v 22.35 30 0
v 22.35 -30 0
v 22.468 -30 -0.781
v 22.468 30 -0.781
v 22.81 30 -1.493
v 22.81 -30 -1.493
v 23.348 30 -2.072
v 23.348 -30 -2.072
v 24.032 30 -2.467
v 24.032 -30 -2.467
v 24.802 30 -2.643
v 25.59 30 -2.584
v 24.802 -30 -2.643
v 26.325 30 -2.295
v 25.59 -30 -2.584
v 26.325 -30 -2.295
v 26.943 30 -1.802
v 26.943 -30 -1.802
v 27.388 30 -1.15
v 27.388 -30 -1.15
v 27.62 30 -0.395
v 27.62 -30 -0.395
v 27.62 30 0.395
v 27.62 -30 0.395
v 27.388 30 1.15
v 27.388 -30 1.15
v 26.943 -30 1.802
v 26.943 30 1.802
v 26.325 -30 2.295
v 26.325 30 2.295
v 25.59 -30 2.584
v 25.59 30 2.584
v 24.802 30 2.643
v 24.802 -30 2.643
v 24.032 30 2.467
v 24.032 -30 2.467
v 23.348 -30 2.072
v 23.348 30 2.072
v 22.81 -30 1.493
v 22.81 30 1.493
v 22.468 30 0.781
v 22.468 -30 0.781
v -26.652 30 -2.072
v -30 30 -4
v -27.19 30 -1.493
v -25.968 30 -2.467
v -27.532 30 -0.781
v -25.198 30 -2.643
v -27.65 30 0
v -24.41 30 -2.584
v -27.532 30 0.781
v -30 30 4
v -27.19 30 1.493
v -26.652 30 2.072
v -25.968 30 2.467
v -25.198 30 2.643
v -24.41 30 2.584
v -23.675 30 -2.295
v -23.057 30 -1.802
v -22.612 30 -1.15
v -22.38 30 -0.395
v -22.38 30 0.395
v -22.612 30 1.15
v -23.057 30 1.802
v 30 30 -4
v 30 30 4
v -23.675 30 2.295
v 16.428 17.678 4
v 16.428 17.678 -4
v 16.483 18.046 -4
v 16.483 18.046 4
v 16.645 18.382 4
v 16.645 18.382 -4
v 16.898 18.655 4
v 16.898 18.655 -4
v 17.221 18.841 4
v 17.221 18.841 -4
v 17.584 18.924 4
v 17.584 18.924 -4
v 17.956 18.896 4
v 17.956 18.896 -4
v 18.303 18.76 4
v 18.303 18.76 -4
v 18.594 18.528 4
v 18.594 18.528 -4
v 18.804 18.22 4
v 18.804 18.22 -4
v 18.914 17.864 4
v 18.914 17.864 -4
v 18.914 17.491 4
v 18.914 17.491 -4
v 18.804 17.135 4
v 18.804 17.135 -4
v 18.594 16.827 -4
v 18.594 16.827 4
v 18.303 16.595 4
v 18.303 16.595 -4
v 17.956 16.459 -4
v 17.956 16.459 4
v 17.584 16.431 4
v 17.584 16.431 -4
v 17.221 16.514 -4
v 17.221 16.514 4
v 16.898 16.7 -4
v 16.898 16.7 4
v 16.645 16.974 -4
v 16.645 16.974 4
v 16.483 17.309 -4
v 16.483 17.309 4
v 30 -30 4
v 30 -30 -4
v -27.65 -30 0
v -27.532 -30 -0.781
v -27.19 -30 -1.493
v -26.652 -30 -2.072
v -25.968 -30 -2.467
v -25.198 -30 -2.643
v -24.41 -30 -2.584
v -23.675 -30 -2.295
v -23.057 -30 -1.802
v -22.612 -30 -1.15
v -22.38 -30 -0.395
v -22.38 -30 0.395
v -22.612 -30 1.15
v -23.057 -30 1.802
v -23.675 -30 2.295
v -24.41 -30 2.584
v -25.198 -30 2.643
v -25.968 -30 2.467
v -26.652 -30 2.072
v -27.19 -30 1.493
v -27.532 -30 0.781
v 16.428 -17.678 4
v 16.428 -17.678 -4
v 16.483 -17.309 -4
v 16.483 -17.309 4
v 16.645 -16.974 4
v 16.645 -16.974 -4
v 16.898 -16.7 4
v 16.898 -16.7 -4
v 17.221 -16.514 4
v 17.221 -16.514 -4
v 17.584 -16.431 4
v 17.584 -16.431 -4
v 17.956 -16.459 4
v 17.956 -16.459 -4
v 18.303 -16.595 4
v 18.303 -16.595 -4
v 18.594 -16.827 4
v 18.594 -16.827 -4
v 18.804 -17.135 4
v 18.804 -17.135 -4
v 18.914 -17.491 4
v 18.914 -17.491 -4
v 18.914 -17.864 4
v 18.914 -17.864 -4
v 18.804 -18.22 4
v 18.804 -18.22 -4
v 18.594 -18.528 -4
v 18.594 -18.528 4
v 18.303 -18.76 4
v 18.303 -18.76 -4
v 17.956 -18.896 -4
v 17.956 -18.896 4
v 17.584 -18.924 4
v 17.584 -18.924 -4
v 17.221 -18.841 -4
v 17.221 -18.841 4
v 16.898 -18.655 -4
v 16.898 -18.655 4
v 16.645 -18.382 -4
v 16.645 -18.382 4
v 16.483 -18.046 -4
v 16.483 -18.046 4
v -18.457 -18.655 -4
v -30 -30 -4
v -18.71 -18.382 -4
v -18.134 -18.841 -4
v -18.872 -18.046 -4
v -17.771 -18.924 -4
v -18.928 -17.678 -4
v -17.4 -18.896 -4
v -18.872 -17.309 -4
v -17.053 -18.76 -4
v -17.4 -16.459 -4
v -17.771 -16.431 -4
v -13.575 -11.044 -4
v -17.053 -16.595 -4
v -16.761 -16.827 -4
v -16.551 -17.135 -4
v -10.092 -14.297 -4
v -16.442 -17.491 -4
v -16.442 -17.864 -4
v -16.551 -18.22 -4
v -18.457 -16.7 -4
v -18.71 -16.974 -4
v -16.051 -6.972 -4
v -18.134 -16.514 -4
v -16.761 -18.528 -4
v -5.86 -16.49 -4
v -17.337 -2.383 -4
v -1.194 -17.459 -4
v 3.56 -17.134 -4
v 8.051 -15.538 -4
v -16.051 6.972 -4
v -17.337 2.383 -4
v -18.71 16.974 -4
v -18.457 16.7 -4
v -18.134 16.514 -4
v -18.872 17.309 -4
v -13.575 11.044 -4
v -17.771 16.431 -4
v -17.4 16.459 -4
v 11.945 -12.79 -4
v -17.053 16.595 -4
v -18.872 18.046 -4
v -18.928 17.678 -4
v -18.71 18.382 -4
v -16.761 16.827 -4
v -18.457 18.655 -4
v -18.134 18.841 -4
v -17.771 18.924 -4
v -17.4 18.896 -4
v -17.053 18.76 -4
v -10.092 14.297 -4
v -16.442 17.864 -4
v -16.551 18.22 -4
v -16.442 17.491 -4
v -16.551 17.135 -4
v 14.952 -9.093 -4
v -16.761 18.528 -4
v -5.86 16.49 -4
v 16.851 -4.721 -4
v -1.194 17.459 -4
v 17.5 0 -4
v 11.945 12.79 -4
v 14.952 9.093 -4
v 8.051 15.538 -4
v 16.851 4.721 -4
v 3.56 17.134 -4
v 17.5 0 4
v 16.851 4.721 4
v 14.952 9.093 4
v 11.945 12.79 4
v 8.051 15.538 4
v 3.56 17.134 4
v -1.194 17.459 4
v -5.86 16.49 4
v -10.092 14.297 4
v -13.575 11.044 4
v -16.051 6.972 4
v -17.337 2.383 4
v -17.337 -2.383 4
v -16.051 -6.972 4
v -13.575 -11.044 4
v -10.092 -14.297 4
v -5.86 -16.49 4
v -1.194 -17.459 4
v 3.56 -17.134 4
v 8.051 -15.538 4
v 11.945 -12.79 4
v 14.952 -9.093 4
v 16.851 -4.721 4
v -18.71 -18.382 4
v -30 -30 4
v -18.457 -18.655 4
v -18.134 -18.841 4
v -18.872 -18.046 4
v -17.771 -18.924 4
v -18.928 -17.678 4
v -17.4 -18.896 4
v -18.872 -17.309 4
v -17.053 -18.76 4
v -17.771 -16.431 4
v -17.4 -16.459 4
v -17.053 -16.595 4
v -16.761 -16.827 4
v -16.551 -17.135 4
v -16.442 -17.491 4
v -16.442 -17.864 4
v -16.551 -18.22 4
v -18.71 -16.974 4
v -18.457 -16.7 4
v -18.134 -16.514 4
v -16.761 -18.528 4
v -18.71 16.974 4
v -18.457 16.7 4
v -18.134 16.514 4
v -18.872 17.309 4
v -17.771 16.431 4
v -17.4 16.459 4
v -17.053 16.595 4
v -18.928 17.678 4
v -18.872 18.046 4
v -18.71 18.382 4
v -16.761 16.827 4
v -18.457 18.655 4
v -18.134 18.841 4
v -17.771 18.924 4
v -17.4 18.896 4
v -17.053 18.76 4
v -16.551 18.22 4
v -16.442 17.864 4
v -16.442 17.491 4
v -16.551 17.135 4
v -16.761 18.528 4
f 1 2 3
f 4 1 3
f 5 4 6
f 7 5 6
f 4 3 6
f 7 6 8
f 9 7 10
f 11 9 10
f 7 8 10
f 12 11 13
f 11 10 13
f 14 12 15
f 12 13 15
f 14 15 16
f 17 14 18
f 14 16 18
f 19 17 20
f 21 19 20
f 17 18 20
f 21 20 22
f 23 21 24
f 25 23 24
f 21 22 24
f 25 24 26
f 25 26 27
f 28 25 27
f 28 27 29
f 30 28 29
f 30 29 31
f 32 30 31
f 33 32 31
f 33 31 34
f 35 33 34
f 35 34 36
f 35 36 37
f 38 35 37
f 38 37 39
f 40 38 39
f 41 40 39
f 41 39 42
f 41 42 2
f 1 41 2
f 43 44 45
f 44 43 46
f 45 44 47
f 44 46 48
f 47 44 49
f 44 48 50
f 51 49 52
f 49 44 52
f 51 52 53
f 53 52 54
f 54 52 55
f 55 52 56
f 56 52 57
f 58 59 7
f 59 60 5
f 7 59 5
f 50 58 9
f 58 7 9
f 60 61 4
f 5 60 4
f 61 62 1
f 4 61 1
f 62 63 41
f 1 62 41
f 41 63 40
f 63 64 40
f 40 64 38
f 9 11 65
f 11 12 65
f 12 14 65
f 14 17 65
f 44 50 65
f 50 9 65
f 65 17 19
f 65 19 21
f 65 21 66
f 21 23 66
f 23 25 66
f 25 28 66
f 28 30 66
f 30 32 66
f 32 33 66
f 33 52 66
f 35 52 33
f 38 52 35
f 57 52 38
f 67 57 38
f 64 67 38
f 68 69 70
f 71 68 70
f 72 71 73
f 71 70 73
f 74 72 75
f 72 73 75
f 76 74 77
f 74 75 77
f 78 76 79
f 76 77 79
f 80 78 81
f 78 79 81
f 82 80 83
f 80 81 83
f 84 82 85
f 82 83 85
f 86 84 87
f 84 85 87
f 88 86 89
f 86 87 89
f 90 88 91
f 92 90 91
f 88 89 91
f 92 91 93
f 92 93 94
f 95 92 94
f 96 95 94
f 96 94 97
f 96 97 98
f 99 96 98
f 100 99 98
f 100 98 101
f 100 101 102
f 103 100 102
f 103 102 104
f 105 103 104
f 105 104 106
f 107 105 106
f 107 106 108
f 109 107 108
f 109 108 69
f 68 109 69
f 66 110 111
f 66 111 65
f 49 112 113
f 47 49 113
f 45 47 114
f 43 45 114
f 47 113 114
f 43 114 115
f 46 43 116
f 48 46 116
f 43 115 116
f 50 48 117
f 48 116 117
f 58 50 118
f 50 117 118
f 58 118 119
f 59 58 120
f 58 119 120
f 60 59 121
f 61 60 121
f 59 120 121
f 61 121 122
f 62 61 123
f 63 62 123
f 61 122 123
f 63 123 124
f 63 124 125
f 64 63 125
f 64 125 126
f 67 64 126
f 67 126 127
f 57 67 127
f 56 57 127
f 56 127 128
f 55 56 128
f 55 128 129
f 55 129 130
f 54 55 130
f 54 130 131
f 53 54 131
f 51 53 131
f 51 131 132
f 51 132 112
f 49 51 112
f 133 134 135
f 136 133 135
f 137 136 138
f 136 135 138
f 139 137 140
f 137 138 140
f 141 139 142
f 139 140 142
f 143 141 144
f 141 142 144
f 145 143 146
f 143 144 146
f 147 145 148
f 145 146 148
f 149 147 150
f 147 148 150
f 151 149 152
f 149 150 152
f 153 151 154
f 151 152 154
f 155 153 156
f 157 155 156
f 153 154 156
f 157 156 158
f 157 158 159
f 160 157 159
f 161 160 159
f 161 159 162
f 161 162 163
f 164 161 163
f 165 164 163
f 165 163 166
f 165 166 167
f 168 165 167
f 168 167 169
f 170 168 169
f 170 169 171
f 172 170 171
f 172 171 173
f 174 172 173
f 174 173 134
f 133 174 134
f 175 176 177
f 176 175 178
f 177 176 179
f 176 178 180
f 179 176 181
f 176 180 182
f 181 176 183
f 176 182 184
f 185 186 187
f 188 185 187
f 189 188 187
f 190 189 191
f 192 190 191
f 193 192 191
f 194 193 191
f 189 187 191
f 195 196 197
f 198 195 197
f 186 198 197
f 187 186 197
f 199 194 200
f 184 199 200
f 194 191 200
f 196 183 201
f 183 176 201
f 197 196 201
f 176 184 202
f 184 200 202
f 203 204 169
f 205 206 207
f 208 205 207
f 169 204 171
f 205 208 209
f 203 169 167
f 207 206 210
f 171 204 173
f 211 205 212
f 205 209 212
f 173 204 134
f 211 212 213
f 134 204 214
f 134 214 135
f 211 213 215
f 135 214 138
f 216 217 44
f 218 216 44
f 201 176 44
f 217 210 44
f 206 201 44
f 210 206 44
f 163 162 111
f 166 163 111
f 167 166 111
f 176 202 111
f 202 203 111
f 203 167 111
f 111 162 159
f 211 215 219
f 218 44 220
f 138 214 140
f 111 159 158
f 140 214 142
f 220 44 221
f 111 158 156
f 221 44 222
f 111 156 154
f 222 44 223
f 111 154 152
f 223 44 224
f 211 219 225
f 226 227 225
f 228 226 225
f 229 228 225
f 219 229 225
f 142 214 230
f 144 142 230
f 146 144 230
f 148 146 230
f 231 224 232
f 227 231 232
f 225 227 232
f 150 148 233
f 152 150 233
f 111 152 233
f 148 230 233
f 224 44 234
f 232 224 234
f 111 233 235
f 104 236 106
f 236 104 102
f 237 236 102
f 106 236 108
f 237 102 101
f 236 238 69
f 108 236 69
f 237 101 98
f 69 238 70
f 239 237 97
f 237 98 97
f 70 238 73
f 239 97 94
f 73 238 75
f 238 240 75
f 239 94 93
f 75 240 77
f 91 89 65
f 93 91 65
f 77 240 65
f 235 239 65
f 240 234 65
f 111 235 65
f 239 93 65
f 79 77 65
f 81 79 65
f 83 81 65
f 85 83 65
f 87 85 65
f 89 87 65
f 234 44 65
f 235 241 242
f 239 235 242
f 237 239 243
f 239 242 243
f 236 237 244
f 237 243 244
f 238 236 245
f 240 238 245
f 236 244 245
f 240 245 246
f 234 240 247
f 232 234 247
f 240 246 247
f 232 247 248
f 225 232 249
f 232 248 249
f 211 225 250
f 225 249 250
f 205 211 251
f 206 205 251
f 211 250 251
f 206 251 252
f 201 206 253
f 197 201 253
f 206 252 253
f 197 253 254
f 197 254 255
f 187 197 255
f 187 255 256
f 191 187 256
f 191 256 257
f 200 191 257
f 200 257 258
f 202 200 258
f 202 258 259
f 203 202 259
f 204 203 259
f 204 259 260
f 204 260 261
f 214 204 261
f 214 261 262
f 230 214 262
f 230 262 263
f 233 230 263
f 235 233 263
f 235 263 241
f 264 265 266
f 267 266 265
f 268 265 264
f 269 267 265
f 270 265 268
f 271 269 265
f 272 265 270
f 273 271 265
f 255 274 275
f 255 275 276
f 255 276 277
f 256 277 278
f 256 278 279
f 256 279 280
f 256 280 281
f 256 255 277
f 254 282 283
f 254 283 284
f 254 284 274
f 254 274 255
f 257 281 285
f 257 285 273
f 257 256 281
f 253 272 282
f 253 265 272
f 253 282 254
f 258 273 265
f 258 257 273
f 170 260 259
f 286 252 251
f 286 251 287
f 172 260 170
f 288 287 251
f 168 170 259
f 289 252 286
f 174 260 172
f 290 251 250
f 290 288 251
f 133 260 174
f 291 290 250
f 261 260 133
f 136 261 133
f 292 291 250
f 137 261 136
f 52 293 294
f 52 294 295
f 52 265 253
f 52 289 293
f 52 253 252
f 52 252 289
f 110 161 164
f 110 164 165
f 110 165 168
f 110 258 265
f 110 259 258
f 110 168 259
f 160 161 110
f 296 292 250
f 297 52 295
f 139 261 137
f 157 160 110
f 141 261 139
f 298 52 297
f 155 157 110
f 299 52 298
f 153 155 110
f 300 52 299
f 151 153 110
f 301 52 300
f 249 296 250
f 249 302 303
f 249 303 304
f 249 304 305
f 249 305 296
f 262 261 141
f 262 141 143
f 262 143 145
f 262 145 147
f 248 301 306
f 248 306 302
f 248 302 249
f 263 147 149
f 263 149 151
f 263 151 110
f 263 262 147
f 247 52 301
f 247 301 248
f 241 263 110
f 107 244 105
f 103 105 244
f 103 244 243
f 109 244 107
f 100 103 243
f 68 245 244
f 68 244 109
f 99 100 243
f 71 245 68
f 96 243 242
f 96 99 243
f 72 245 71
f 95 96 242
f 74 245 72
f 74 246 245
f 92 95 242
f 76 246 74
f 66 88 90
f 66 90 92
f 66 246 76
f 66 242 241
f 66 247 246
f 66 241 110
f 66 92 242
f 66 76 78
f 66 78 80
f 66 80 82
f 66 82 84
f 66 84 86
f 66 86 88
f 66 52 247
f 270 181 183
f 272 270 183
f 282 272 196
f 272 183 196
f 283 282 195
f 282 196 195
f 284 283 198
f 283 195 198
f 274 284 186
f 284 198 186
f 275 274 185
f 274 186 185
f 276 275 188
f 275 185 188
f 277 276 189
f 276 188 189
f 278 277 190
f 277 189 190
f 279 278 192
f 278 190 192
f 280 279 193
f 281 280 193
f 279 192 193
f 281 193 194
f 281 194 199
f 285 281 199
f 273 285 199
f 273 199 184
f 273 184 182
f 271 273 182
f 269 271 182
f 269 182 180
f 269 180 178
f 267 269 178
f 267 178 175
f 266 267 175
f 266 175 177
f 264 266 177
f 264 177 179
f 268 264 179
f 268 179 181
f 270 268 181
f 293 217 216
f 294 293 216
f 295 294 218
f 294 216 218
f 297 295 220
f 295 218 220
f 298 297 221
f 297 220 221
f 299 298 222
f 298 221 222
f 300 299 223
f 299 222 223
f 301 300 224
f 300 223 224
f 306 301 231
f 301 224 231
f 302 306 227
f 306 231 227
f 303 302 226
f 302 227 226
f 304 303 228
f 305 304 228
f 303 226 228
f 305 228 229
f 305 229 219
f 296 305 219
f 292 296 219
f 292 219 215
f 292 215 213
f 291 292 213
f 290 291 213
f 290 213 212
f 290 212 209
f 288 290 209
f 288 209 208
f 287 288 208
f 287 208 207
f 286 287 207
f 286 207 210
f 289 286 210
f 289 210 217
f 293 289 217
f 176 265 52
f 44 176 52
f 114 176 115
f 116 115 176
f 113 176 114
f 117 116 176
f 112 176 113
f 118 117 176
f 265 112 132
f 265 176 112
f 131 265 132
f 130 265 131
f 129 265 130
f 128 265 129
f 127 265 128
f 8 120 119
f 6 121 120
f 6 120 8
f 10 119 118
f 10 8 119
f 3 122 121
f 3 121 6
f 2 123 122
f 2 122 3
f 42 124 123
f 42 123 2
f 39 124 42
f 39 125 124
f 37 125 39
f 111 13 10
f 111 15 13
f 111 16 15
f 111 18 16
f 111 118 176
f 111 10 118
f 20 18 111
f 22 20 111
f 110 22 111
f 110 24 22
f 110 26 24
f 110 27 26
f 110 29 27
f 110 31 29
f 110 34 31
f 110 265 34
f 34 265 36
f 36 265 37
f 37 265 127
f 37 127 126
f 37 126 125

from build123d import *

# Parameters (mm, degrees)
SKETCH_1_W          = 60
SKETCH_1_H          = 60
EXTRUDE_1_DEPTH     = 4
SKETCH_2_R          = 17.5
CUT_EXTRUDE_1_DEPTH = 44.17406629
HOLE_WIZARD_M3_1_D  = 2.5
HOLE_WIZARD_M5_1_D  = 5.3


with BuildPart() as part:
    # 草圖1 → 填料-伸長1 (new, symmetric)
    with BuildSketch(Plane.XY):
        Rectangle(SKETCH_1_W, SKETCH_1_H)
    extrude(amount=EXTRUDE_1_DEPTH, both=True)

    # 草圖2 → 除料-伸長1 (cut, through all)
    with BuildSketch(Plane.XY.offset(4)):
        Circle(SKETCH_2_R)
    extrude(amount=-CUT_EXTRUDE_1_DEPTH, mode=Mode.SUBTRACT)

    # M3 螺紋孔1 (through all)
    with Locations(Plane.XY.offset(4)):
        with Locations((17.67766953, -17.67766953), (17.67766953, 17.67766953), (-17.67766953, -17.67766953), (-17.67766953, 17.67766953)):
            Hole(HOLE_WIZARD_M3_1_D / 2)

    # M5 餘隙孔1 (through all)
    with Locations(Plane(origin=(0, 30, 0), x_dir=(1, 0, 0), z_dir=(0, 1, 0))):
        with Locations((-25, 0), (25, 0)):
            Hole(HOLE_WIZARD_M5_1_D / 2)


solid = part.part
